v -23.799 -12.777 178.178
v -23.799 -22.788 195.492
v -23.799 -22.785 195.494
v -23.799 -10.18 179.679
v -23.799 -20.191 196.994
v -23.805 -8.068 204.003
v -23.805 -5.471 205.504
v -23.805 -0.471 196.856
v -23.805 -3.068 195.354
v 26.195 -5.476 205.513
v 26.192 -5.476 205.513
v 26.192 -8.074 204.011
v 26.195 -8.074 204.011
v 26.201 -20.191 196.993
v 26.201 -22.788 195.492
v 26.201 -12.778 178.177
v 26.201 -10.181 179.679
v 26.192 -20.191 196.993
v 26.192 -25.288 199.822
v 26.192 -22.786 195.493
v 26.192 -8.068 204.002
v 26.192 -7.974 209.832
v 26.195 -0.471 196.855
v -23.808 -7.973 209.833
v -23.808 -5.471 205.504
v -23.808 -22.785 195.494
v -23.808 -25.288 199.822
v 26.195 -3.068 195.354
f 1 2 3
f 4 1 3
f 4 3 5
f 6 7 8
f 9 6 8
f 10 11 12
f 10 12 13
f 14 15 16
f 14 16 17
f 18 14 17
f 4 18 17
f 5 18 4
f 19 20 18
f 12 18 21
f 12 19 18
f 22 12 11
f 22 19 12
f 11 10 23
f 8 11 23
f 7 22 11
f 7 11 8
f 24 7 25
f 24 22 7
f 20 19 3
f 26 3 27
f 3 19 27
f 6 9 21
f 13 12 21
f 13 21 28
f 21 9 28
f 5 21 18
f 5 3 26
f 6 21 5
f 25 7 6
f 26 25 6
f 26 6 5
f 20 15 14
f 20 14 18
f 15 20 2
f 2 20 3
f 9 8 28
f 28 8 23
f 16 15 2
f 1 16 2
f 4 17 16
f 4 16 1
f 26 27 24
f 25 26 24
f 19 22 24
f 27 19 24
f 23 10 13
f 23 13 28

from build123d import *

# Parameters (mm, degrees)
SKETCH057_W             = 50
SKETCH057_H             = 20
PAD056_DEPTH            = 5
SKETCH058_W             = 50
SKETCH058_H             = 3
PAD057_DEPTH            = 20
SKETCH059_W             = 50
SKETCH059_H             = 10
PAD058_DEPTH            = 3
BODY043_ROLL_ANGLE      = 149.965102
BODY043_PITCH_ANGLE     = -0.000568
BODY043_PLACEMENT_ANGLE = 179.999625


with BuildPart() as part:
    # Sketch057 → Pad056 (new body)
    with BuildSketch(Plane.XY):
        with Locations((184.845276, -123.914059)):
            Rectangle(SKETCH057_W, SKETCH057_H)
    extrude(amount=PAD056_DEPTH)

    # Sketch058 (on Face6 of Pad056) → Pad057 (join)
    with BuildSketch(Plane.XY.offset(5)):
        with Locations((184.83606, -132.417099)):
            Rectangle(SKETCH058_W, SKETCH058_H)
    extrude(amount=PAD057_DEPTH)

    # Sketch059 (on Face7 of Pad057) → Pad058 (join)
    with BuildSketch(Plane(origin=(0, -113.914059, 0), x_dir=(-1, 0, 0), z_dir=(0, 1, 0))):
        with Locations((-184.841869, 9.989668)):
            Rectangle(SKETCH059_W, SKETCH059_H)
    extrude(amount=-PAD058_DEPTH)


with BuildPart() as part_1:
    # Body043 roll: moved
    add(part.part.rotate(Axis((0, 0, 0), (1, 0, 0)), BODY043_ROLL_ANGLE))


with BuildPart() as part_2:
    # Body043 pitch: moved
    add(part_1.part.rotate(Axis((0, 0, 0), (0, 1, 0)), BODY043_PITCH_ANGLE))


with BuildPart() as part_3:
    # Body043 placement: moved
    add(part_2.part.moved(Location((186.038525, 90.64289, 266.847744))).rotate(Axis((186.038525, 90.64289, 266.847744), (0, 0, 1)), BODY043_PLACEMENT_ANGLE))


solid = part_3.part
